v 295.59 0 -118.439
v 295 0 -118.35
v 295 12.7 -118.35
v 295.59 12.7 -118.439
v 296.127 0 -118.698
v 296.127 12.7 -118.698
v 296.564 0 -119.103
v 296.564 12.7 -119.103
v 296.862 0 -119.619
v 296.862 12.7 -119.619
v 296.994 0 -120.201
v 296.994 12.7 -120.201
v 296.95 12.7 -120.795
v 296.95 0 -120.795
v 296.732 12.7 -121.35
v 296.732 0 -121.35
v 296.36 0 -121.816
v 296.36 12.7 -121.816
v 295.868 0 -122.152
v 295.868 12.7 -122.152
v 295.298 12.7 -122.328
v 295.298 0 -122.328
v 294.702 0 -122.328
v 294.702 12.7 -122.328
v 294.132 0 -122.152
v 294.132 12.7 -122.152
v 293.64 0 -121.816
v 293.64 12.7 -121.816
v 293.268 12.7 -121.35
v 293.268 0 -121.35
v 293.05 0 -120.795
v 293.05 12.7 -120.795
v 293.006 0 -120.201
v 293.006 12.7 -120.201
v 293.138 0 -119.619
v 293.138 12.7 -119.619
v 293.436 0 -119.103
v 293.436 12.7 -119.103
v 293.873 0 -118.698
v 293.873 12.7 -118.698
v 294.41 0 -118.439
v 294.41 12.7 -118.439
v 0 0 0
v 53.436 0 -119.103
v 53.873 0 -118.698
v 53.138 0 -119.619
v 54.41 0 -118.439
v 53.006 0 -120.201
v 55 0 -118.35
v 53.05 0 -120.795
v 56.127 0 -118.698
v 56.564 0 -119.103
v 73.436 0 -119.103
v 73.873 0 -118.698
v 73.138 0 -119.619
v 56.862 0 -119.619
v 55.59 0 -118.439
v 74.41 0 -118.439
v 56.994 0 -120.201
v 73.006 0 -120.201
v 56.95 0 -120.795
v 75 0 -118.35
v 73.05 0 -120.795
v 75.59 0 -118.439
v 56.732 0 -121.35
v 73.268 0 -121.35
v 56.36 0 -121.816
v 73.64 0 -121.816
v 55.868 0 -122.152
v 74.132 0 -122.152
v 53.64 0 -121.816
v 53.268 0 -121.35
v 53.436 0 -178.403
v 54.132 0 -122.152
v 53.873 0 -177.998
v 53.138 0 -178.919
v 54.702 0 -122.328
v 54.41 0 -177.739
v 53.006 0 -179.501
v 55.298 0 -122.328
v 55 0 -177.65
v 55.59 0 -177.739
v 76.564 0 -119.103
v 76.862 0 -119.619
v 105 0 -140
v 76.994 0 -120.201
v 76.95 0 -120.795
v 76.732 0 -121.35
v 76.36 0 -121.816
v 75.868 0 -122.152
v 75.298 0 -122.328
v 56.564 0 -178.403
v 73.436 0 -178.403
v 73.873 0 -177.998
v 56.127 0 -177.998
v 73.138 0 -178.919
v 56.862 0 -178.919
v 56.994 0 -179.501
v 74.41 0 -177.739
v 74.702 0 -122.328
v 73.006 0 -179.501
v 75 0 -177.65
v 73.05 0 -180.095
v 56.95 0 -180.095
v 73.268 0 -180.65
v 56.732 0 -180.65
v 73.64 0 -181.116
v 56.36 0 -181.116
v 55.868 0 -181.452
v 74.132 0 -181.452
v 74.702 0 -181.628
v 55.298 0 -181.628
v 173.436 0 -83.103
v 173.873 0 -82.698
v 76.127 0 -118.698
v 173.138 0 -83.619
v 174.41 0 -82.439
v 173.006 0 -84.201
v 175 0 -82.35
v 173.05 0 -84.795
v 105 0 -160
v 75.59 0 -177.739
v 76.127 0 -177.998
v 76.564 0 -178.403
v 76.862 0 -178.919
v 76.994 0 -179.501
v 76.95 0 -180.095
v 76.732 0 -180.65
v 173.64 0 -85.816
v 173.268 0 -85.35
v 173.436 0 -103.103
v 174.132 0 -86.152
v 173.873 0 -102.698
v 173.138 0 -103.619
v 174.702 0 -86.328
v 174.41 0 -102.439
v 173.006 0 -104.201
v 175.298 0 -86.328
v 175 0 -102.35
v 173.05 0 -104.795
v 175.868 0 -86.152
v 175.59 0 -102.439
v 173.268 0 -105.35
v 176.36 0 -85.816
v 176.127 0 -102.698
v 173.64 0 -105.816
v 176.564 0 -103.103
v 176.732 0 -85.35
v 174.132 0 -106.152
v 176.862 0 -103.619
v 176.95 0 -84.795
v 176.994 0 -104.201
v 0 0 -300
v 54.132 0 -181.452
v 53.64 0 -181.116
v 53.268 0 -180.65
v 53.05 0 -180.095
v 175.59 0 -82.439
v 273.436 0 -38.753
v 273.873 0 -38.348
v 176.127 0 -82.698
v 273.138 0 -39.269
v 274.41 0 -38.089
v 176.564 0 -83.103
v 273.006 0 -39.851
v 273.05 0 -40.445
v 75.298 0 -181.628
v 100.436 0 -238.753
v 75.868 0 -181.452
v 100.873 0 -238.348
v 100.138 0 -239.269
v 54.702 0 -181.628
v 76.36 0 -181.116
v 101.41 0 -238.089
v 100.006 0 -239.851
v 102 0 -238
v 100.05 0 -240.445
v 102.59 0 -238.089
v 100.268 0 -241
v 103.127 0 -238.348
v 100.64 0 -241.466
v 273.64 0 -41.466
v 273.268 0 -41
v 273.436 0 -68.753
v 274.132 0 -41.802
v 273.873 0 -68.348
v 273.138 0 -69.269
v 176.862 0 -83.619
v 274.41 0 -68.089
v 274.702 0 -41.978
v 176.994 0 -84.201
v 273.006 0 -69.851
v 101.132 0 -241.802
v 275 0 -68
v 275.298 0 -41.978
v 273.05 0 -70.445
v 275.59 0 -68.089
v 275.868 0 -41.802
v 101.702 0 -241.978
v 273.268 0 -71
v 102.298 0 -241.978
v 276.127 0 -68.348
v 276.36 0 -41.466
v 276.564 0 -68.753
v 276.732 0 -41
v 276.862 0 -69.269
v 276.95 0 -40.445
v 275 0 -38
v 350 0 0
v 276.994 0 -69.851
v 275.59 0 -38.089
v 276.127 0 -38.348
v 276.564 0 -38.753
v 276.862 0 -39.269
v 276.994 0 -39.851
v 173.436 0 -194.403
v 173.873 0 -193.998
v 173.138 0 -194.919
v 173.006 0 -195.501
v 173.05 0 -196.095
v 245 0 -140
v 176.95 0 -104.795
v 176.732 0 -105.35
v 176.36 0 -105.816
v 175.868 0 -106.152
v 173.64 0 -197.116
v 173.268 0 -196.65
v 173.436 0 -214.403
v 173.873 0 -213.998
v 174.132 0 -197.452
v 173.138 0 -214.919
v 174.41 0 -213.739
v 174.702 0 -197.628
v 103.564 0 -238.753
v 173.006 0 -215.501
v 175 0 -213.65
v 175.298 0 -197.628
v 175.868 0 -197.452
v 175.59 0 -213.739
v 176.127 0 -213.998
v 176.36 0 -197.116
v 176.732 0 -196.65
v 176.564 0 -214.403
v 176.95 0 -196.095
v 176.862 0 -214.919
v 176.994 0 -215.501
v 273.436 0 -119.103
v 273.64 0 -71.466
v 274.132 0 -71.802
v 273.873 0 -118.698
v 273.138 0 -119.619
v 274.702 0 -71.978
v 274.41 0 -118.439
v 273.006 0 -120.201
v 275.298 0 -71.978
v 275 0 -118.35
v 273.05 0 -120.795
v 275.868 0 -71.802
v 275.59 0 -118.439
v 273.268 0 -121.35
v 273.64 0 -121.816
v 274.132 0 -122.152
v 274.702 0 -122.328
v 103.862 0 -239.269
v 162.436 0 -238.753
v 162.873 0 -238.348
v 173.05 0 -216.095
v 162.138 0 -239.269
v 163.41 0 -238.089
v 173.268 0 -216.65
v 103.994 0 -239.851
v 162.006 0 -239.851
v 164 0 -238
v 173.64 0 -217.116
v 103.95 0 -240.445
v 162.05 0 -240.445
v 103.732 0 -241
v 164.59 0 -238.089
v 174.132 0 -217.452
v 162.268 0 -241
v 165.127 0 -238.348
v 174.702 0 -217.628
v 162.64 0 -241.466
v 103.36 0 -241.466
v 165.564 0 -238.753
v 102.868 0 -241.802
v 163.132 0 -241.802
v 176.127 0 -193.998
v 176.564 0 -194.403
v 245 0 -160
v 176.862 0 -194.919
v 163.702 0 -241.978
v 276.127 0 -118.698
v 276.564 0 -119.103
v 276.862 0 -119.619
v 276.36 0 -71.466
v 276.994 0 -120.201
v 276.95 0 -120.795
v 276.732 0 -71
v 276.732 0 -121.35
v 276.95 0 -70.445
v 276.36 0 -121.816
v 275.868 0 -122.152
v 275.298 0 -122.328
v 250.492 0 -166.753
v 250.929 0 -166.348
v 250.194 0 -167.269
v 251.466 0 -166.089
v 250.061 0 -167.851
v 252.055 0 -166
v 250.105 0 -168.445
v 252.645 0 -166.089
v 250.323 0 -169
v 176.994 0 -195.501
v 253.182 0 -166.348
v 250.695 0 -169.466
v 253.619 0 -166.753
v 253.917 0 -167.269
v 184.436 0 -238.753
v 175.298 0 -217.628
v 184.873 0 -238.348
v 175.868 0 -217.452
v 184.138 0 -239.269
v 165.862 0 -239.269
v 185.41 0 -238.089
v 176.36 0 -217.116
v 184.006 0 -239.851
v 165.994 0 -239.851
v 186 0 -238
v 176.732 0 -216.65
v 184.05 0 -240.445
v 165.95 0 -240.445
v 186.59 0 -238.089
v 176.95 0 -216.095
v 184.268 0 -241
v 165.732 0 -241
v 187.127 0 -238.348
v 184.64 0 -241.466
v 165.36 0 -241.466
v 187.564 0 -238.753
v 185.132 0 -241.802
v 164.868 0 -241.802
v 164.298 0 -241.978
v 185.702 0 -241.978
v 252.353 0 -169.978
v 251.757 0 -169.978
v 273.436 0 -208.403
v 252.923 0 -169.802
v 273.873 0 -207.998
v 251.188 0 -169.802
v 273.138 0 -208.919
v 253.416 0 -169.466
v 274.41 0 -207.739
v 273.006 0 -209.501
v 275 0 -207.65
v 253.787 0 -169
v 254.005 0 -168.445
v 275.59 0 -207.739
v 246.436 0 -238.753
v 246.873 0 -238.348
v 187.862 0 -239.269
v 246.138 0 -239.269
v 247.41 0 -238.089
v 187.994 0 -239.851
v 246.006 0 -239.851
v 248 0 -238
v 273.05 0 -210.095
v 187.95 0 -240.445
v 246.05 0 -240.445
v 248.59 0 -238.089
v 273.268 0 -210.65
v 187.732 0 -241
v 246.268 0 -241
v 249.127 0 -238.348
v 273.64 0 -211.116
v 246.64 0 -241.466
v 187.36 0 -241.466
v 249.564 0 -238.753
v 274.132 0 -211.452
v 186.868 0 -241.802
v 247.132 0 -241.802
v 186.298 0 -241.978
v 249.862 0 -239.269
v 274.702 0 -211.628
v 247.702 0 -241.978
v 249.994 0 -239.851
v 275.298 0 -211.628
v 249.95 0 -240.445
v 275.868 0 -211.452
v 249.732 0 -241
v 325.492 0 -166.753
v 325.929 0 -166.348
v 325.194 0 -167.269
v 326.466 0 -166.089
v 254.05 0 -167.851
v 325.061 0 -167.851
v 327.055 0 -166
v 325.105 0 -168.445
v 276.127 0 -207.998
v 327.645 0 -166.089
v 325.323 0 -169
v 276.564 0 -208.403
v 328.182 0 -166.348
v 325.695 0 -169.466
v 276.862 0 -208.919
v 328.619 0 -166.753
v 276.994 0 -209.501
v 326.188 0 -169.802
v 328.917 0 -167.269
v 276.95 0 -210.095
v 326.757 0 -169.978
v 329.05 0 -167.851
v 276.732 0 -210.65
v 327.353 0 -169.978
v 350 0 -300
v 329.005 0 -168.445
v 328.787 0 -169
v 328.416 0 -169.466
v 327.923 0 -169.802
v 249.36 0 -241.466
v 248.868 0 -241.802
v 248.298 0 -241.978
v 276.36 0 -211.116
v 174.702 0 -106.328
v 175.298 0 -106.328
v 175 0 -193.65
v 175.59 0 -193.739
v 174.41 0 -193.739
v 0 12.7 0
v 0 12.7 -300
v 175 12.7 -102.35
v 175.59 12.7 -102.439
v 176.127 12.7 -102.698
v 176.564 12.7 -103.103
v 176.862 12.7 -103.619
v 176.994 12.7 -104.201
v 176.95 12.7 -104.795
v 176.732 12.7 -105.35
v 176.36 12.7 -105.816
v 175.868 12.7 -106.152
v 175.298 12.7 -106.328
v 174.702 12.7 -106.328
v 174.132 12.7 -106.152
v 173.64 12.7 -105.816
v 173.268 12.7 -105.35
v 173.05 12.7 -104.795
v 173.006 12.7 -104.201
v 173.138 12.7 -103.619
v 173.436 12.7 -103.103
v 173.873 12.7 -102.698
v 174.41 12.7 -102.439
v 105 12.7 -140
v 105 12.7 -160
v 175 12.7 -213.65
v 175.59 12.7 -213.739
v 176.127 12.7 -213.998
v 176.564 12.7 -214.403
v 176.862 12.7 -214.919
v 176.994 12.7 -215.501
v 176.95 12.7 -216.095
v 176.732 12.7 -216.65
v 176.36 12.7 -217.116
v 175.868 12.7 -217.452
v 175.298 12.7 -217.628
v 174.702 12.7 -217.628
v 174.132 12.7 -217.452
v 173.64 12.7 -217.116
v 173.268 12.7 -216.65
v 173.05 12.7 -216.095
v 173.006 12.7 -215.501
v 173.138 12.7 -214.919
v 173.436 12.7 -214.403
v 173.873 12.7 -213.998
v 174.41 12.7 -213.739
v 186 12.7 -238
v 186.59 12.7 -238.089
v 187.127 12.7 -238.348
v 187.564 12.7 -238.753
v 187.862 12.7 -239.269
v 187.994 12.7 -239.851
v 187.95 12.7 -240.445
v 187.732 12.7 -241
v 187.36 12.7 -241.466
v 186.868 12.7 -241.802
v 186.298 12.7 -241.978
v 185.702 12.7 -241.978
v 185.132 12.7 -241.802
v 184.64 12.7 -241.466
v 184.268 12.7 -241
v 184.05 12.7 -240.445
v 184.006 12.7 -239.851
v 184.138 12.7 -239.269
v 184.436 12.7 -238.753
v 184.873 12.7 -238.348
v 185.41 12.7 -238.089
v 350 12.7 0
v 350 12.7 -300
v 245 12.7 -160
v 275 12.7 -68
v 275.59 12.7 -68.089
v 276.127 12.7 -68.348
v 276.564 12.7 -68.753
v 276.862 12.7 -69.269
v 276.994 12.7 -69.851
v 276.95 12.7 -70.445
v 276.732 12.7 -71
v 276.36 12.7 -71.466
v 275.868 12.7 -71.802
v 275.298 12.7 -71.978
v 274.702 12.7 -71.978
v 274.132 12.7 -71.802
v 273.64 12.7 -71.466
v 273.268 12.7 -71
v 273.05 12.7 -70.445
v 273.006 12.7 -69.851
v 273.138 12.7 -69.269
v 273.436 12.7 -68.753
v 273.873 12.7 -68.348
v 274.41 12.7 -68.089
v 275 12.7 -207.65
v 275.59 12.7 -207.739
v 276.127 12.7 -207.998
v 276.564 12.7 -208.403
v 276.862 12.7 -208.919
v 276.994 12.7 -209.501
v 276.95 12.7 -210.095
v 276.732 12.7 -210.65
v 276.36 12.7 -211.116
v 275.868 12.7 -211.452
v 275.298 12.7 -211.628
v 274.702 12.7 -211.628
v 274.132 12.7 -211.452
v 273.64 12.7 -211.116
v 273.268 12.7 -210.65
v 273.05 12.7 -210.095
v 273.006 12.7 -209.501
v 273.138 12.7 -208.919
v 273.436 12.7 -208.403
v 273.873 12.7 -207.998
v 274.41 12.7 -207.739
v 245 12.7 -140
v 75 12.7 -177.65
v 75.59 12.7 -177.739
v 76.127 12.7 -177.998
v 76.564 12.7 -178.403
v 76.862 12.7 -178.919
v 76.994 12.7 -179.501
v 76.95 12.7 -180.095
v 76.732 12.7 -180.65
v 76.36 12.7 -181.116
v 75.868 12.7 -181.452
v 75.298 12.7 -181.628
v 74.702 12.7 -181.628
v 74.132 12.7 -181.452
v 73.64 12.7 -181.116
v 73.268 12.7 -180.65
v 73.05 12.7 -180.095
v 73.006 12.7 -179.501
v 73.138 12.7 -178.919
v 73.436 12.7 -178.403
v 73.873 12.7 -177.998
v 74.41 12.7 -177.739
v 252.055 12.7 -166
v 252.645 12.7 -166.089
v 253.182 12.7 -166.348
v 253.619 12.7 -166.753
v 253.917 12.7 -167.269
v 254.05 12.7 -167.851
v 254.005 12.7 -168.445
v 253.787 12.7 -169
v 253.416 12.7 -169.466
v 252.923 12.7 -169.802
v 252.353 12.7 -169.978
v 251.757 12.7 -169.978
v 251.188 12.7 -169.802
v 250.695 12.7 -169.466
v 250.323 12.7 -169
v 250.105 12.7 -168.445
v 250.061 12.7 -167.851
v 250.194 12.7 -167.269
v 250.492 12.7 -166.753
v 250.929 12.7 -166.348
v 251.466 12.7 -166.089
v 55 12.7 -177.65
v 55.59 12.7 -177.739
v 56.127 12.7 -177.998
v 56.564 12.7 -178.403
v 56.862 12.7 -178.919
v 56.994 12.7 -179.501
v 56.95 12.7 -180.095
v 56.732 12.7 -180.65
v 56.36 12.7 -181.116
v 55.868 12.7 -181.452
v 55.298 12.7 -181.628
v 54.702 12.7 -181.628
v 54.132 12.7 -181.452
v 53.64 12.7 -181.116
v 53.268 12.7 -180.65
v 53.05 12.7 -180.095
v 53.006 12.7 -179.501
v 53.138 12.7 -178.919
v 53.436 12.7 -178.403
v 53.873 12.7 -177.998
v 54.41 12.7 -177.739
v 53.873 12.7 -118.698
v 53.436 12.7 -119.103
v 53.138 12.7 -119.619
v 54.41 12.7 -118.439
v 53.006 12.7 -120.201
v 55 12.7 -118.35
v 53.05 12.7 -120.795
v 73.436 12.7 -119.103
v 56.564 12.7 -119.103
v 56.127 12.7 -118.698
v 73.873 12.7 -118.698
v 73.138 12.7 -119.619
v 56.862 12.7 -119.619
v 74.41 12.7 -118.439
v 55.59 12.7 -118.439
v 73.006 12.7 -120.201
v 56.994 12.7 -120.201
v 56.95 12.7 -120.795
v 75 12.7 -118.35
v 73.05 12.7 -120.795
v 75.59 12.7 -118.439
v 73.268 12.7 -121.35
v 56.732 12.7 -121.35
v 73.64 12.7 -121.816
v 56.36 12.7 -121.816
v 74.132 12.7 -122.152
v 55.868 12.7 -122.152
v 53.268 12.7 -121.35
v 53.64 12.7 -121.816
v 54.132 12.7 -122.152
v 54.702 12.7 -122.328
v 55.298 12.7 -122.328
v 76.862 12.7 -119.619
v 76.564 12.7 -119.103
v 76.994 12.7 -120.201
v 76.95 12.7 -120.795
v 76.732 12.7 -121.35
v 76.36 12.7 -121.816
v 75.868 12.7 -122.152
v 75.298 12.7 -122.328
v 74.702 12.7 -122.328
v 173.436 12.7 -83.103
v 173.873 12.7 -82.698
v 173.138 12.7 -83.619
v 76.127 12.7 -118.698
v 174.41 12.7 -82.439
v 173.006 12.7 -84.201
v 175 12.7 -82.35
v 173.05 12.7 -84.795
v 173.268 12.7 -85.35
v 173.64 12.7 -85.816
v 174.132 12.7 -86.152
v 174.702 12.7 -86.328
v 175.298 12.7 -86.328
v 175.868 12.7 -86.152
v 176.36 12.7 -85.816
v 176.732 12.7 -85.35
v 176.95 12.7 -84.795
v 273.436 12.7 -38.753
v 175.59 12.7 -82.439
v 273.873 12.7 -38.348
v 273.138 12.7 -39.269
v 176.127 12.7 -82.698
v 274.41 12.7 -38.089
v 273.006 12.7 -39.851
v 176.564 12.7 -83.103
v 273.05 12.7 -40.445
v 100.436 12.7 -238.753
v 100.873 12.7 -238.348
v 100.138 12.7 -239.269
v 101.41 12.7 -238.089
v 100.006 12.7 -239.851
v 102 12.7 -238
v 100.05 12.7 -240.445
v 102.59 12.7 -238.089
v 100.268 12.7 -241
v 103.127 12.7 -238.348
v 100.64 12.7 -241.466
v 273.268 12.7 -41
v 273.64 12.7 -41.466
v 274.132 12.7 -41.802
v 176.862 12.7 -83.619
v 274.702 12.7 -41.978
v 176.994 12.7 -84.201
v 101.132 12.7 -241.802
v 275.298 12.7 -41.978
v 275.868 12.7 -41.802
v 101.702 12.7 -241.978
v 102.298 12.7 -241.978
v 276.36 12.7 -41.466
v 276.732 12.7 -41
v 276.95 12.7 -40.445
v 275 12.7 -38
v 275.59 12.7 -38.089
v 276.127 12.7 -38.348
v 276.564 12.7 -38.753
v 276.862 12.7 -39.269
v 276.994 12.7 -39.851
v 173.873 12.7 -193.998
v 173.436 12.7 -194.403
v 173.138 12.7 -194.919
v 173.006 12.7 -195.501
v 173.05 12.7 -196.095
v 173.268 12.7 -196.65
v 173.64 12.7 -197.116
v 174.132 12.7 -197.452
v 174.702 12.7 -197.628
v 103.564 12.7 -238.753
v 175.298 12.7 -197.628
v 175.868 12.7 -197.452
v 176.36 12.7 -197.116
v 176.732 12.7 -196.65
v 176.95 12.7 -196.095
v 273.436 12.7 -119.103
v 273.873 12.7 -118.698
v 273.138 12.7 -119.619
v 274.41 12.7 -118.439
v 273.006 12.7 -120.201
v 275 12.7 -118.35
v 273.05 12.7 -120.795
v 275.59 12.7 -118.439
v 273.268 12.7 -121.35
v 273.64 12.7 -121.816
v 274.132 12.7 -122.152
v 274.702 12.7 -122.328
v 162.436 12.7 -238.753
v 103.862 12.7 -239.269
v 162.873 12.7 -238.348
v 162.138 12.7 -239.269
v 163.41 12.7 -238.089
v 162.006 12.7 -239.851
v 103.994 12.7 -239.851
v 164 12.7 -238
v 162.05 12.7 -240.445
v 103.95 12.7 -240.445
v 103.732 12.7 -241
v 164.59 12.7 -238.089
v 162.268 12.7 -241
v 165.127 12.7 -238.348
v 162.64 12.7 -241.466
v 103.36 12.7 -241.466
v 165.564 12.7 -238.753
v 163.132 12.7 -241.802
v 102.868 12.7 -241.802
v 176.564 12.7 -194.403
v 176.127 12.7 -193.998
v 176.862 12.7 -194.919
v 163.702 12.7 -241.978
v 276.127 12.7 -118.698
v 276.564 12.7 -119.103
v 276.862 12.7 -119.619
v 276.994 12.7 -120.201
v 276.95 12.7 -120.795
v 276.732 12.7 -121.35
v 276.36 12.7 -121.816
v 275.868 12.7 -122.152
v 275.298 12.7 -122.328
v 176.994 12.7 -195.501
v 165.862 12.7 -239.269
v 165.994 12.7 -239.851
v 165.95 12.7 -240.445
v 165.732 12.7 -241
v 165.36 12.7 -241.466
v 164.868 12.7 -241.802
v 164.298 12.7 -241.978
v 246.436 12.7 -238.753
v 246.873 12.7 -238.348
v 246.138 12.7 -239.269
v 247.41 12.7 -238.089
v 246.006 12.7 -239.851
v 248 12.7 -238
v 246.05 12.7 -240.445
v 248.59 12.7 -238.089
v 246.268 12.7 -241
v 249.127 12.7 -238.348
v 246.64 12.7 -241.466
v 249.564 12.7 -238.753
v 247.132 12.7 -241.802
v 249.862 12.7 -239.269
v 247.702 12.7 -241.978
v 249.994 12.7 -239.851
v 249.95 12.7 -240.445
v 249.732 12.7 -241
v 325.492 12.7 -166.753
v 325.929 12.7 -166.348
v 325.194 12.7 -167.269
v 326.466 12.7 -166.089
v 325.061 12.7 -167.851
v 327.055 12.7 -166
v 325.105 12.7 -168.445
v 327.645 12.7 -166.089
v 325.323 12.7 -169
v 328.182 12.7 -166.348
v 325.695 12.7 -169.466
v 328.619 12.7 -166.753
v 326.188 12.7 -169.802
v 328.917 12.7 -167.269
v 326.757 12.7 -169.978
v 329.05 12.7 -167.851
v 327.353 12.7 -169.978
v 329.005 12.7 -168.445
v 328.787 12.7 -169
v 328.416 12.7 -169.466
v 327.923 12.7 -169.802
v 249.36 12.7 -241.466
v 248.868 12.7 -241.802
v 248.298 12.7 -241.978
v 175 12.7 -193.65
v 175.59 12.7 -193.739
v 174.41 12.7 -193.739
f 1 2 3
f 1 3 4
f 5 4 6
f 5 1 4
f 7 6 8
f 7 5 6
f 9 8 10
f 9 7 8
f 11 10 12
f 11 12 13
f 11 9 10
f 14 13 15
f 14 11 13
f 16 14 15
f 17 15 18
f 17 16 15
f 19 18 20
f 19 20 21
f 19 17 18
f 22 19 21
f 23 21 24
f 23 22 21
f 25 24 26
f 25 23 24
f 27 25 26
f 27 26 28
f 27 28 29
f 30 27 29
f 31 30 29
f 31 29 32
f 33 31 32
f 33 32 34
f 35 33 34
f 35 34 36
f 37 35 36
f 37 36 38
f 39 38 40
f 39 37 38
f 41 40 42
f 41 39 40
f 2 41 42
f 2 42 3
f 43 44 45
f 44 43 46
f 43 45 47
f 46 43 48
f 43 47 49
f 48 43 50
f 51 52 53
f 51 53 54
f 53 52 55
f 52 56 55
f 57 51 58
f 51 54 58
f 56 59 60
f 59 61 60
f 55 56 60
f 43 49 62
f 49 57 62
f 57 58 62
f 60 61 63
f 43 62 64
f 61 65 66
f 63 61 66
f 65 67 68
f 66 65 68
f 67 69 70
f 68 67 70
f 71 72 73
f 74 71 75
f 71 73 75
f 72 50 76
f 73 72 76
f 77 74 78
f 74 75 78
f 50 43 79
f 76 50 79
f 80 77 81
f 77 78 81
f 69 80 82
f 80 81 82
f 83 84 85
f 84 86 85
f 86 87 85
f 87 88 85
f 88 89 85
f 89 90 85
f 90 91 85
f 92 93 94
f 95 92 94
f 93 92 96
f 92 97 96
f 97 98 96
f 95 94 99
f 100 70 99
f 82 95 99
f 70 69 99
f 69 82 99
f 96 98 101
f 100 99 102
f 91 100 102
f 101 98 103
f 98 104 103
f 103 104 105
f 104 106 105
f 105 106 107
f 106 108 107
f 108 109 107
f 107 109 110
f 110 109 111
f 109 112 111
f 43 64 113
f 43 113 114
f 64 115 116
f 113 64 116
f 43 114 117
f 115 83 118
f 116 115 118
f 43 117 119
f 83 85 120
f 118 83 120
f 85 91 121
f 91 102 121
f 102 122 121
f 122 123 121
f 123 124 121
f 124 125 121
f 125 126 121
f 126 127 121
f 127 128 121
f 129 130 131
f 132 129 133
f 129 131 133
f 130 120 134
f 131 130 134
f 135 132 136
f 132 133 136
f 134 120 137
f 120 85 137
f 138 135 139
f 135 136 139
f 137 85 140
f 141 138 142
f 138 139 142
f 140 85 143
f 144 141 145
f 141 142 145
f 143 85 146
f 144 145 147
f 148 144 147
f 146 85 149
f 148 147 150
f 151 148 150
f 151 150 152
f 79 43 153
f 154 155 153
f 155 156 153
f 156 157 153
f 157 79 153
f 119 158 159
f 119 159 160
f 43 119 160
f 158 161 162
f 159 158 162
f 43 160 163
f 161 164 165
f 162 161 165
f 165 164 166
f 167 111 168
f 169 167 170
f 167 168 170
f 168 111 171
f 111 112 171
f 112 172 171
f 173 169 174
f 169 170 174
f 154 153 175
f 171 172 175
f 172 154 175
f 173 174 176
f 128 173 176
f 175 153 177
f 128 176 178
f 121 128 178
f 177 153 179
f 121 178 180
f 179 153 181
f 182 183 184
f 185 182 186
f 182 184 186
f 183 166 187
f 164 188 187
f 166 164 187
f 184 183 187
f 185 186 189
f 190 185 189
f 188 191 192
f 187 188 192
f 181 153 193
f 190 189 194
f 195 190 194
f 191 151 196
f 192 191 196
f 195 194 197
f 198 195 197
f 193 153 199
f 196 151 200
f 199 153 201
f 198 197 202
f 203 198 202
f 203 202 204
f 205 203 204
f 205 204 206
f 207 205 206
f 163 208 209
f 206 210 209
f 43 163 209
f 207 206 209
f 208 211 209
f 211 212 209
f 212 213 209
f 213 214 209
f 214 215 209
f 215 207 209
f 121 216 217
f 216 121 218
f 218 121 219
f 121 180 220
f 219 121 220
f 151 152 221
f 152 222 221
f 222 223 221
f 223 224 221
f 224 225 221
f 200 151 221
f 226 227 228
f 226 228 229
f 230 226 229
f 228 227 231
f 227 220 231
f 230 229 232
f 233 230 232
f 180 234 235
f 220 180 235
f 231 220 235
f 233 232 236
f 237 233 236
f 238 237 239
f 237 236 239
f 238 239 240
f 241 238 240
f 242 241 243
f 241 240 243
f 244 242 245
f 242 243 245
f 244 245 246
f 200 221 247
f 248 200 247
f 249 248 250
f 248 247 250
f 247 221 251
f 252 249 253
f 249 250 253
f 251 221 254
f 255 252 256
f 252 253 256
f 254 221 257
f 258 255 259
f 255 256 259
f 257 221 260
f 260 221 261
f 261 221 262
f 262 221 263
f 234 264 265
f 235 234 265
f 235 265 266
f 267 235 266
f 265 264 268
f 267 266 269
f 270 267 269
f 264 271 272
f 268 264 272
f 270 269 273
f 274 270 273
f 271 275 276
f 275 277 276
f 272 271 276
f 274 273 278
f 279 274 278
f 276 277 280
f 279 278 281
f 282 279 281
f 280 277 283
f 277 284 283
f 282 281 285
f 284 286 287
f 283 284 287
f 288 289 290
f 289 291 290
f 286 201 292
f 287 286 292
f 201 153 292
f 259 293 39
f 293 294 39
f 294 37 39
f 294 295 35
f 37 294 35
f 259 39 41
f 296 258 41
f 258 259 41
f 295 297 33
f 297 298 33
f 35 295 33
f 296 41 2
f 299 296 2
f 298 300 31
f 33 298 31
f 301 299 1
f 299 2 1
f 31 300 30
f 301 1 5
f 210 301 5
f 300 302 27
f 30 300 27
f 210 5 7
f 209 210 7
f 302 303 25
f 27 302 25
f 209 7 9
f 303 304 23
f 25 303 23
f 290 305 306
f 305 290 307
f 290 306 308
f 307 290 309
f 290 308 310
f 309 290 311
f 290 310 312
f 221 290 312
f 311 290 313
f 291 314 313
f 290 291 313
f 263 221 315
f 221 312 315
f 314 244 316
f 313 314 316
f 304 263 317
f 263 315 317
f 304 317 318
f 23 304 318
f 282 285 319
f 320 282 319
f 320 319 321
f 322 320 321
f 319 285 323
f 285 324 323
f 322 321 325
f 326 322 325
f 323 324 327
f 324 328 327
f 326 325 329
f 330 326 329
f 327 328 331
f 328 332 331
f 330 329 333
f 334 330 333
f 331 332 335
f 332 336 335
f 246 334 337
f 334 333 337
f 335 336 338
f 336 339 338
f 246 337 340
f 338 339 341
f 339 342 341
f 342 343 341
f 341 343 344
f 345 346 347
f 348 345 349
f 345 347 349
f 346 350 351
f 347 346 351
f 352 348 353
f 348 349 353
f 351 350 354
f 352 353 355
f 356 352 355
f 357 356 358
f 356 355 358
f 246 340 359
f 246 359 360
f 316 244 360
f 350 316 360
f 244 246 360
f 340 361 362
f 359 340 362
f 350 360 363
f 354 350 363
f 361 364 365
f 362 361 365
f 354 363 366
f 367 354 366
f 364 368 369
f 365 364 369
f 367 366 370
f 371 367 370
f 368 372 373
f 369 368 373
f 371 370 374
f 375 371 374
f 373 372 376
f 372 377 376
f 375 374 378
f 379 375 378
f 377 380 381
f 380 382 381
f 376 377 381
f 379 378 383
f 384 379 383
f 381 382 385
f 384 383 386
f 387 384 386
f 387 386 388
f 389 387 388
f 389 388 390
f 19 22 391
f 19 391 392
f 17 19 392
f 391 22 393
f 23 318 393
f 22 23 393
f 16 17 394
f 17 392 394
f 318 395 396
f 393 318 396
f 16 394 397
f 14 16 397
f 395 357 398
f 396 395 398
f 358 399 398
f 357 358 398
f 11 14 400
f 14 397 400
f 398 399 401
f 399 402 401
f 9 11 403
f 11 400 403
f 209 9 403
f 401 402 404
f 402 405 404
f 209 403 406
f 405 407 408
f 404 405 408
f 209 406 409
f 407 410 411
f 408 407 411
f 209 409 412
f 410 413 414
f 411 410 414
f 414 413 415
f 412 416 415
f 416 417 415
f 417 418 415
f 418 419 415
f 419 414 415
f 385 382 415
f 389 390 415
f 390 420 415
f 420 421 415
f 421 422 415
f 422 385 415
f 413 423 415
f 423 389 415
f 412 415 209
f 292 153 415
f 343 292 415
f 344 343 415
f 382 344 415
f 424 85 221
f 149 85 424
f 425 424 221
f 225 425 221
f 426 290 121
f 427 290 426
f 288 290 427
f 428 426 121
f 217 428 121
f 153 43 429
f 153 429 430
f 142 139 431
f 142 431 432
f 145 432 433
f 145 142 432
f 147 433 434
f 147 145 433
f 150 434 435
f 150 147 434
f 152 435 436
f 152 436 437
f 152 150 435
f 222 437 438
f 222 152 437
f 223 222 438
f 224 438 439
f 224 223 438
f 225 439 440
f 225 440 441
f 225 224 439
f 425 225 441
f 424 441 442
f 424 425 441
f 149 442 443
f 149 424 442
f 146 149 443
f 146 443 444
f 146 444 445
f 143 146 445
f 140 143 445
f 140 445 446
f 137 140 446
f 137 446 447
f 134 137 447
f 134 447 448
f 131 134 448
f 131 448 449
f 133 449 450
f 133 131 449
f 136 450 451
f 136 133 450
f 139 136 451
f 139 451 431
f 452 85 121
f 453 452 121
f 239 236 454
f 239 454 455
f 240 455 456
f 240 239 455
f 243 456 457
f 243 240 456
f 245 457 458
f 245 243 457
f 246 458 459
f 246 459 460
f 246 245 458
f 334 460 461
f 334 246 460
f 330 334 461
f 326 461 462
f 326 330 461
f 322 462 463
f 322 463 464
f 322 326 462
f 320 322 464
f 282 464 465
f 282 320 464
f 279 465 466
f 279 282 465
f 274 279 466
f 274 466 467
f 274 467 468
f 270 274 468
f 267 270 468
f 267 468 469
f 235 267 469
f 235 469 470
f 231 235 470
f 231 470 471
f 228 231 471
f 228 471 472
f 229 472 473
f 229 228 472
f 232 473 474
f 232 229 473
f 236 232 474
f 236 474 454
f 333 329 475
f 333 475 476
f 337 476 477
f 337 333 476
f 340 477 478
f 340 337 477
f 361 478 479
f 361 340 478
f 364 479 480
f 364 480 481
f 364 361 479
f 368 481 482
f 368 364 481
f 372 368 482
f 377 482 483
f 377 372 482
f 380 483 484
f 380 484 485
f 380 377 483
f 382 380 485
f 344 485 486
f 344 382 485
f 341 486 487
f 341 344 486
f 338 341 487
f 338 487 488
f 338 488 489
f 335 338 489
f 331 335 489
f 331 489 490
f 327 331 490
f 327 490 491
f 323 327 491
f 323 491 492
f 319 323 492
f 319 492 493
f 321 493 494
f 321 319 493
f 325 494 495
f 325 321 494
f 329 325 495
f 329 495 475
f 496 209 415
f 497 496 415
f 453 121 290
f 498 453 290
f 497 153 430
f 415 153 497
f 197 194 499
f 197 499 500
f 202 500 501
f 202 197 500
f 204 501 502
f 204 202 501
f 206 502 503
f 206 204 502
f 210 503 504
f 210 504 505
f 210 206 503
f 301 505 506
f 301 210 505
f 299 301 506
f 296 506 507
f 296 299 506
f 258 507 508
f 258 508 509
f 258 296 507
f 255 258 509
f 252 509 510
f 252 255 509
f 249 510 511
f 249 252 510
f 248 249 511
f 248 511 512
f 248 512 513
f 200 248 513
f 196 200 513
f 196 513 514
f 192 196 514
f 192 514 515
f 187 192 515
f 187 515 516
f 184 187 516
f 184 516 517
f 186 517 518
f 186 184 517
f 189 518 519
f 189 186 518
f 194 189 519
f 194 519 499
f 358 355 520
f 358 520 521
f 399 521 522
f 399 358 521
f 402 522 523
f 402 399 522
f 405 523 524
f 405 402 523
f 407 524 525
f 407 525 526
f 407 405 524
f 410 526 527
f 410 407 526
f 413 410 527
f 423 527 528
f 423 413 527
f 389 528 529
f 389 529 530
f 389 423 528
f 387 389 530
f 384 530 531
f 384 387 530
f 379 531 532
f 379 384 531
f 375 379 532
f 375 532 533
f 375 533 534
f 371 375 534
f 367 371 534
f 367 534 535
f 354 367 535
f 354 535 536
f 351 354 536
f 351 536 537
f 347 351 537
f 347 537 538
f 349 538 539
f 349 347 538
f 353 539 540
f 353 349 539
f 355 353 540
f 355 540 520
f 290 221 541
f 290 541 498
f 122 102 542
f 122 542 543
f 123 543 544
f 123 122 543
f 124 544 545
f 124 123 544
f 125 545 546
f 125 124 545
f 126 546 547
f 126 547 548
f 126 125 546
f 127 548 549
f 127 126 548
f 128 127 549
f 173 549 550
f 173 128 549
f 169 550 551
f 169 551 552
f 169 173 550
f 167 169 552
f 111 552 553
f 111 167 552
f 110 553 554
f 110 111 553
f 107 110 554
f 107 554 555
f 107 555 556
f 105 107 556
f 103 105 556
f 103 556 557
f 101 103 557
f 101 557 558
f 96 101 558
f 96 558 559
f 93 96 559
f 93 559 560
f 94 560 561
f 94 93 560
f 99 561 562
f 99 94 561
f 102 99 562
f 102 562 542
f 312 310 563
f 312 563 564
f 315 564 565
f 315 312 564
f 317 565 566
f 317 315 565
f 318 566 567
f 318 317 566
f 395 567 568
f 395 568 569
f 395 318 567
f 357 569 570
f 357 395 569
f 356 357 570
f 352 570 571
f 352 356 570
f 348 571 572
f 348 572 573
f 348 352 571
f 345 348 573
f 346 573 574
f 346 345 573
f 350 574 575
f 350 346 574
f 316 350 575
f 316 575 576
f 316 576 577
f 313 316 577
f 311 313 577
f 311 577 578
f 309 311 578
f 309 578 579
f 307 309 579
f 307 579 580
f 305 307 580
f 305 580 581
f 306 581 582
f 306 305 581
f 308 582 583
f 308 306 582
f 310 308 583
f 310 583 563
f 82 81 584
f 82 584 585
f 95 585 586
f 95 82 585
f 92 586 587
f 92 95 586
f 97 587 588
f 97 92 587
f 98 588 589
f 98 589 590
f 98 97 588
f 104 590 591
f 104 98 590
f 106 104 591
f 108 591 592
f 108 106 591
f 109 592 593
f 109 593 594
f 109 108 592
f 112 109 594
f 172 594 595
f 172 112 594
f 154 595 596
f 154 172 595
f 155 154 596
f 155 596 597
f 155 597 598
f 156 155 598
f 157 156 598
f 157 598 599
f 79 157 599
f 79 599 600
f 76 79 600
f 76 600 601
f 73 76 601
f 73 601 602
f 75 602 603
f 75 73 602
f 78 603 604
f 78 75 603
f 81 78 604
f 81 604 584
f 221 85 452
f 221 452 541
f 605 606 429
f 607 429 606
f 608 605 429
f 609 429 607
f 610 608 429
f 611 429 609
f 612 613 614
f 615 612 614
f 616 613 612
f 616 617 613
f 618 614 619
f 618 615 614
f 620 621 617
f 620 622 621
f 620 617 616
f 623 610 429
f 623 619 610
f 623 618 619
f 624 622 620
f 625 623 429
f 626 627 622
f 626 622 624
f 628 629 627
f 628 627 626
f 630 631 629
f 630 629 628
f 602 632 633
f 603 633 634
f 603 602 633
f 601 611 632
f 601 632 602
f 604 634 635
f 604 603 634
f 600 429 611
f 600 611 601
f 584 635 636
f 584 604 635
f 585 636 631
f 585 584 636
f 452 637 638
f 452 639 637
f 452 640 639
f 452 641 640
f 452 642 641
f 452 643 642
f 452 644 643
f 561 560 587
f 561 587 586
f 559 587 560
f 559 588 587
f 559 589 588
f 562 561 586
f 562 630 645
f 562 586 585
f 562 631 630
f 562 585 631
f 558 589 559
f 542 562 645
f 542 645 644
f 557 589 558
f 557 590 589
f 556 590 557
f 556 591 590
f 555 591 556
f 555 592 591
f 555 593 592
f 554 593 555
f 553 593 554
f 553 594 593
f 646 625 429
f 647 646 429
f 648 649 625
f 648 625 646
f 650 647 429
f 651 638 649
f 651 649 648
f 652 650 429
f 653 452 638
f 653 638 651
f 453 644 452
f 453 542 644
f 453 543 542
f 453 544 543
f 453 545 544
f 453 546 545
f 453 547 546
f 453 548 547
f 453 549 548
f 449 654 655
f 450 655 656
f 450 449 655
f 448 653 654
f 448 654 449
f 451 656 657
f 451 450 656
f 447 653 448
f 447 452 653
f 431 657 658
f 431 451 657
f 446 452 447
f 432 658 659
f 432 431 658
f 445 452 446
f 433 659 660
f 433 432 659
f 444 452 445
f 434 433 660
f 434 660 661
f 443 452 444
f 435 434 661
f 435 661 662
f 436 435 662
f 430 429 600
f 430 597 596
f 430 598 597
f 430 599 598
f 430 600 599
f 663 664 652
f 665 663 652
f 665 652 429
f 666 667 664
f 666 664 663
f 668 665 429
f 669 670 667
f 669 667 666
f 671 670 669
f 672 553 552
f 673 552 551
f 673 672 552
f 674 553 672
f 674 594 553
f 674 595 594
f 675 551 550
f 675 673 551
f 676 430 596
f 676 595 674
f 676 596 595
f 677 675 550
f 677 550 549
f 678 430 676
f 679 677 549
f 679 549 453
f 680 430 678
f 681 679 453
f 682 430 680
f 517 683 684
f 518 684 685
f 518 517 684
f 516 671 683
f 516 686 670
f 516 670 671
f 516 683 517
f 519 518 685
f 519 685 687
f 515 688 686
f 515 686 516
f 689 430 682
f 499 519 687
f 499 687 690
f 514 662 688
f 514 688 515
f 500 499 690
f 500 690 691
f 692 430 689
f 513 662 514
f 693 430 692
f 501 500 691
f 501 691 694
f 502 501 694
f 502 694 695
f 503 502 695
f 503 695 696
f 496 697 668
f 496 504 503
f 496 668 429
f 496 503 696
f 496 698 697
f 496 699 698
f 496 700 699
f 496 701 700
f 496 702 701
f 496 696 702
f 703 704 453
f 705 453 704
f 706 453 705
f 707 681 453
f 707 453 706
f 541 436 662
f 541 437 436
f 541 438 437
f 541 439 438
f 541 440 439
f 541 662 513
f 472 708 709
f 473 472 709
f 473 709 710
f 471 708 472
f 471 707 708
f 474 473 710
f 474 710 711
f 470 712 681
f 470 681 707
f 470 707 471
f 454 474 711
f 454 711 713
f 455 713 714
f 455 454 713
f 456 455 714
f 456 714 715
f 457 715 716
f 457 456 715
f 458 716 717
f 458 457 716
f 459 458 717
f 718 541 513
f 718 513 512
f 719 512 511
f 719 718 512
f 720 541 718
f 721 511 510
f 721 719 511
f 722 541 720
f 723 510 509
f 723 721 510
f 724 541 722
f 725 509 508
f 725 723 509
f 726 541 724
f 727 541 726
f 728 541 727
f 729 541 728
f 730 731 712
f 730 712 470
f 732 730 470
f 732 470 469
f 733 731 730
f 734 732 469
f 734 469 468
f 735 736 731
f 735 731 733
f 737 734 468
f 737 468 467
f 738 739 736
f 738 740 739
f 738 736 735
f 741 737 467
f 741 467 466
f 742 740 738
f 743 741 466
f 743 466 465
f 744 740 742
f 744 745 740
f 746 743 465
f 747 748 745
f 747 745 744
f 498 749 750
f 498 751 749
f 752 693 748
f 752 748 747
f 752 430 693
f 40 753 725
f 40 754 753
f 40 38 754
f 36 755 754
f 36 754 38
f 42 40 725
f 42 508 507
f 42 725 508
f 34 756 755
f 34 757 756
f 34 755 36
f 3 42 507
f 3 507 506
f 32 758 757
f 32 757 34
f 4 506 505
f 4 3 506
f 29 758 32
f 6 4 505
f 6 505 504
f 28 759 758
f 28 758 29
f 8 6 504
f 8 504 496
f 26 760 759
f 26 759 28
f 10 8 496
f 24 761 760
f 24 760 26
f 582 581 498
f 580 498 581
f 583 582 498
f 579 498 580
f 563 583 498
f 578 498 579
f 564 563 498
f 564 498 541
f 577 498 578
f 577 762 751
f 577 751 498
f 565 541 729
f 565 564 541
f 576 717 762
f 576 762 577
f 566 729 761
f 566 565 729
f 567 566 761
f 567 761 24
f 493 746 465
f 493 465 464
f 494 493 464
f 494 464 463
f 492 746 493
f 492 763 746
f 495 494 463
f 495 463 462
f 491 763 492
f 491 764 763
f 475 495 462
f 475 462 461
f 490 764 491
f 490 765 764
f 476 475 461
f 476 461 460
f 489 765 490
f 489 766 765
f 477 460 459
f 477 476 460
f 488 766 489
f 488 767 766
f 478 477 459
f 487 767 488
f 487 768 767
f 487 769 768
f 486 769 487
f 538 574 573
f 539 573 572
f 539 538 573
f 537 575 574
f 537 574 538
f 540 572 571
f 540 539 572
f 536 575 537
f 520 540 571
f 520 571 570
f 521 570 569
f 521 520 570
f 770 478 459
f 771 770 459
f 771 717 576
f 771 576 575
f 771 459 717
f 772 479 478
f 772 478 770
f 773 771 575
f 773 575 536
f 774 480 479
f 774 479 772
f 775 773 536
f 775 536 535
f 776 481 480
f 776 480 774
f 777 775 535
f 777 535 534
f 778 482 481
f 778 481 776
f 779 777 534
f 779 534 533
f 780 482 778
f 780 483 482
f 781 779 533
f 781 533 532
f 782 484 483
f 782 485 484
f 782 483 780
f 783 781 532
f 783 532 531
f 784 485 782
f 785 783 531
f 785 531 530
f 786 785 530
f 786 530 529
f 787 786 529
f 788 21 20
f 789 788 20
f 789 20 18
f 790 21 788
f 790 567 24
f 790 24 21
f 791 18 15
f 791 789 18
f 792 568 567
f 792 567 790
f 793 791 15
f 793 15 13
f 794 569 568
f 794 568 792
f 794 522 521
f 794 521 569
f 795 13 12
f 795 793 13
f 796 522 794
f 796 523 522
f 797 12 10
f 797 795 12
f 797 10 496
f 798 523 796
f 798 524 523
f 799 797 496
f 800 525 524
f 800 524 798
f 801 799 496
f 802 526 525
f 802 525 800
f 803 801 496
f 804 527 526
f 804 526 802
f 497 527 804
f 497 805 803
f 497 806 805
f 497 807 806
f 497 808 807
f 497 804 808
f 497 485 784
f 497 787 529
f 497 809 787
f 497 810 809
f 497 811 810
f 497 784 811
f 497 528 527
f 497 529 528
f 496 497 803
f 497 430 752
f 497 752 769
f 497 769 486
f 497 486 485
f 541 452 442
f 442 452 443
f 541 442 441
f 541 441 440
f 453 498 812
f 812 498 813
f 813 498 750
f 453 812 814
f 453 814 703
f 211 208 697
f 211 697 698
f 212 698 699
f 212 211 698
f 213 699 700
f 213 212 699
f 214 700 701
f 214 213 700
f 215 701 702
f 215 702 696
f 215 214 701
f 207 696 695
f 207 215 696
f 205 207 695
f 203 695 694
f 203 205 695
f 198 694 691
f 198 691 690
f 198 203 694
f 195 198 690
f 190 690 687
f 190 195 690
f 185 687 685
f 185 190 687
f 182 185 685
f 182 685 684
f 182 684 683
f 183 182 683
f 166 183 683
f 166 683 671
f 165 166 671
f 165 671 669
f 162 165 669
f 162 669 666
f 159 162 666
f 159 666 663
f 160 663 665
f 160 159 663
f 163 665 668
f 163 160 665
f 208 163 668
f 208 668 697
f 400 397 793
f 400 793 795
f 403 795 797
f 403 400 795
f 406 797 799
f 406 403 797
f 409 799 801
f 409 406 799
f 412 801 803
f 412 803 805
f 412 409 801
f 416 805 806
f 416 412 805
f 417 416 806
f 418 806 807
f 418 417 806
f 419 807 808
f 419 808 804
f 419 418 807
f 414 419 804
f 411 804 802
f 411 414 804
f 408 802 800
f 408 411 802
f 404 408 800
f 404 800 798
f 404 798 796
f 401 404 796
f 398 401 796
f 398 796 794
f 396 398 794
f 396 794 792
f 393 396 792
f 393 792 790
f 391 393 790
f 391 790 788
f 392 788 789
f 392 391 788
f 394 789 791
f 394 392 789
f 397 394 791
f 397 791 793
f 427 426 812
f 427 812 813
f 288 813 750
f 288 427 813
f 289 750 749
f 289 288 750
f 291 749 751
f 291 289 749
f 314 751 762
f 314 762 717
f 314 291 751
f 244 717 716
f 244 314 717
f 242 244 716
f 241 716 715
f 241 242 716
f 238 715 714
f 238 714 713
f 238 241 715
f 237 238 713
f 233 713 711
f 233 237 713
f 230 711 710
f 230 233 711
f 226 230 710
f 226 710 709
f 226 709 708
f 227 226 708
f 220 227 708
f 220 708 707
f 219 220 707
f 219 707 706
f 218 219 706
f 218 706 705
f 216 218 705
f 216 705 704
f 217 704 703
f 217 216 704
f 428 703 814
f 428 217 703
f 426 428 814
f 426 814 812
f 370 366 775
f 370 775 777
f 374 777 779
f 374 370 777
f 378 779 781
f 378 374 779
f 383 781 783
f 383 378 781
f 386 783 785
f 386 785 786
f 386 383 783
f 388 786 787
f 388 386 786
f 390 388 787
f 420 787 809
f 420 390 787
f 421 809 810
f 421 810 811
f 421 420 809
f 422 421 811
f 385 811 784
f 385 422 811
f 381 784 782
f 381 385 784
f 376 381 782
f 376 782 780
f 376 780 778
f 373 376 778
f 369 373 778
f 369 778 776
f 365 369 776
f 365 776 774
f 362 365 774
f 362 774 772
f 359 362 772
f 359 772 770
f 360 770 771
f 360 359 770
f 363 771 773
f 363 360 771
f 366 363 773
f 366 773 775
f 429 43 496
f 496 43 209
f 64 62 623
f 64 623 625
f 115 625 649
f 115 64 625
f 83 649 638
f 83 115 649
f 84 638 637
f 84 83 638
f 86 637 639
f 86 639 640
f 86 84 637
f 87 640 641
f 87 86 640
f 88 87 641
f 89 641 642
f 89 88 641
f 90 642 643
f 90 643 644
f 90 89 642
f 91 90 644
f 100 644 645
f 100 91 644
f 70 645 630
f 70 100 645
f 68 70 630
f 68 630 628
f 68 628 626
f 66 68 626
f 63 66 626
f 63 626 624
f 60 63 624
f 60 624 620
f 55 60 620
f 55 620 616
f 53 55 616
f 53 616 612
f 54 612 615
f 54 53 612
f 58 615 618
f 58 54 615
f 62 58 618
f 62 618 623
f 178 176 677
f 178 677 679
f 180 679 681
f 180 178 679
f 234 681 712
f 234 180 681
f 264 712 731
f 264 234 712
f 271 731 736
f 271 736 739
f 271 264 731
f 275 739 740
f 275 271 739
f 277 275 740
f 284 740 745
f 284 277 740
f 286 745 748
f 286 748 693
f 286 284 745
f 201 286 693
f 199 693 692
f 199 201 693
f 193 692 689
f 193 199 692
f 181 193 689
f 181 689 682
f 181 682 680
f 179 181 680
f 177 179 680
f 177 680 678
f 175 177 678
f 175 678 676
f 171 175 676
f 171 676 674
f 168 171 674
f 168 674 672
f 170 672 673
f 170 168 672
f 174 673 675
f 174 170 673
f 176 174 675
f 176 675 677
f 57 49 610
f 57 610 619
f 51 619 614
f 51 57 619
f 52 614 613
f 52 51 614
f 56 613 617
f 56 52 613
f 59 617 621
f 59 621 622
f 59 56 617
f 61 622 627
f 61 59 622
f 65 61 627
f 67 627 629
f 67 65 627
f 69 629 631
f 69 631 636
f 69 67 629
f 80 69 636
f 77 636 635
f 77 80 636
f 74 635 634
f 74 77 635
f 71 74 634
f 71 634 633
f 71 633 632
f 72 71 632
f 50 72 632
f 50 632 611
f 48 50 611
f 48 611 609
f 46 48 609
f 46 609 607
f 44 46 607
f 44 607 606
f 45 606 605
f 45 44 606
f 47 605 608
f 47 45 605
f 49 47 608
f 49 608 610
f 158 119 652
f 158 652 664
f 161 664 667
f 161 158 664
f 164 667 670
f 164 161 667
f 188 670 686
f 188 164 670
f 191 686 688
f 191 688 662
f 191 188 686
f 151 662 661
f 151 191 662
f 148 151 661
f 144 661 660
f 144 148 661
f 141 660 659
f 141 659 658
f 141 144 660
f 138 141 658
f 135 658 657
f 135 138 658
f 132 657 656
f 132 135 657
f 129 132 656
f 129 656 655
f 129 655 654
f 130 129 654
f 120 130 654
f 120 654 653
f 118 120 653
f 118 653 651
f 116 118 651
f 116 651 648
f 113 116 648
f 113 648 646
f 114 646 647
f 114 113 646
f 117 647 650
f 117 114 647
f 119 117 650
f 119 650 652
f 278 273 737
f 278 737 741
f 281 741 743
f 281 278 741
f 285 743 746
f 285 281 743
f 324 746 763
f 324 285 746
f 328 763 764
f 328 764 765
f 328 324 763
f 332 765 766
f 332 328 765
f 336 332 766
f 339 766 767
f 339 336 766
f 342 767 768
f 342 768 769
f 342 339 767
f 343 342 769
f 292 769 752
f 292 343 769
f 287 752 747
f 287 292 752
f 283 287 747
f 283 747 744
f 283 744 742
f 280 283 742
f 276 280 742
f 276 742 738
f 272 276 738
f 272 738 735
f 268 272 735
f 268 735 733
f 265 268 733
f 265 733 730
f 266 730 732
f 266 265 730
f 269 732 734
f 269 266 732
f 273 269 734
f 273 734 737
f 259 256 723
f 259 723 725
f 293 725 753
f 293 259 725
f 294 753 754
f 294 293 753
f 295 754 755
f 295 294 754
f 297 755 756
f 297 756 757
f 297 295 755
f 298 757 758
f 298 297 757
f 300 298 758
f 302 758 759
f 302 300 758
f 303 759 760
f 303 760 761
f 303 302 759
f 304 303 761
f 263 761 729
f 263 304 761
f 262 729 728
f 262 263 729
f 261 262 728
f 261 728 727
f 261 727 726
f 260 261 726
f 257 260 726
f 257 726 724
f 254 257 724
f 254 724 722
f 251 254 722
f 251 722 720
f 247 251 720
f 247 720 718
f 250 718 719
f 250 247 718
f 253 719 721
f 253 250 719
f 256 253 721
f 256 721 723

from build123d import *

# Parameters (mm, degrees)
SKETCH1_W           = 350
SKETCH1_H           = 300
SKETCH1_R           = 2
SKETCH1_W_2         = 140
SKETCH1_H_2         = 20
BOSS_EXTRUDE1_DEPTH = 12.7


with BuildPart() as part:
    # Sketch1 → Boss-Extrude1 (new body)
    with BuildSketch(Plane(origin=(0, 0, 0), x_dir=(1, 0, 0), z_dir=(0, 1, 0))):
        with Locations((175, 150)):
            Rectangle(SKETCH1_W, SKETCH1_H)
        with Locations(Location((102, 240, 0), (0, 0, 270))):
            Circle(SKETCH1_R, mode=Mode.SUBTRACT)
        with Locations(Location((248, 240, 0), (0, 0, 270))):
            Circle(SKETCH1_R, mode=Mode.SUBTRACT)
        with Locations(Location((275, 70, 0), (0, 0, 270))):
            Circle(SKETCH1_R, mode=Mode.SUBTRACT)
        with Locations(Location((275, 40, 0), (0, 0, 270))):
            Circle(SKETCH1_R, mode=Mode.SUBTRACT)
        with Locations(Location((186, 240, 0), (0, 0, 270))):
            Circle(SKETCH1_R, mode=Mode.SUBTRACT)
        with Locations(Location((164, 240, 0), (0, 0, 270))):
            Circle(SKETCH1_R, mode=Mode.SUBTRACT)
        with Locations(Location((175, 195.65, 0), (0, 0, 270))):
            Circle(SKETCH1_R, mode=Mode.SUBTRACT)
        with Locations(Location((175, 215.65, 0), (0, 0, 270))):
            Circle(SKETCH1_R, mode=Mode.SUBTRACT)
        with Locations(Location((175, 104.35, 0), (0, 0, 270))):
            Circle(SKETCH1_R, mode=Mode.SUBTRACT)
        with Locations(Location((175, 84.35, 0), (0, 0, 270))):
            Circle(SKETCH1_R, mode=Mode.SUBTRACT)
        with Locations(Location((252.055354108, 168, 0), (0, 0, 270))):
            Circle(SKETCH1_R, mode=Mode.SUBTRACT)
        with Locations(Location((327.055354108, 168, 0), (0, 0, 270))):
            Circle(SKETCH1_R, mode=Mode.SUBTRACT)
        with Locations(Location((75, 120.35, 0), (0, 0, 270))):
            Circle(SKETCH1_R, mode=Mode.SUBTRACT)
        with Locations(Location((55, 120.35, 0), (0, 0, 270))):
            Circle(SKETCH1_R, mode=Mode.SUBTRACT)
        with Locations(Location((275, 120.35, 0), (0, 0, 270))):
            Circle(SKETCH1_R, mode=Mode.SUBTRACT)
        with Locations(Location((295, 120.35, 0), (0, 0, 270))):
            Circle(SKETCH1_R, mode=Mode.SUBTRACT)
        with Locations(Location((75, 179.65, 0), (0, 0, 270))):
            Circle(SKETCH1_R, mode=Mode.SUBTRACT)
        with Locations(Location((55, 179.65, 0), (0, 0, 270))):
            Circle(SKETCH1_R, mode=Mode.SUBTRACT)
        with Locations(Location((275, 209.65, 0), (0, 0, 270))):
            Circle(SKETCH1_R, mode=Mode.SUBTRACT)
        with Locations((175, 150)):
            Rectangle(SKETCH1_W_2, SKETCH1_H_2, mode=Mode.SUBTRACT)
    extrude(amount=BOSS_EXTRUDE1_DEPTH)


solid = part.part
